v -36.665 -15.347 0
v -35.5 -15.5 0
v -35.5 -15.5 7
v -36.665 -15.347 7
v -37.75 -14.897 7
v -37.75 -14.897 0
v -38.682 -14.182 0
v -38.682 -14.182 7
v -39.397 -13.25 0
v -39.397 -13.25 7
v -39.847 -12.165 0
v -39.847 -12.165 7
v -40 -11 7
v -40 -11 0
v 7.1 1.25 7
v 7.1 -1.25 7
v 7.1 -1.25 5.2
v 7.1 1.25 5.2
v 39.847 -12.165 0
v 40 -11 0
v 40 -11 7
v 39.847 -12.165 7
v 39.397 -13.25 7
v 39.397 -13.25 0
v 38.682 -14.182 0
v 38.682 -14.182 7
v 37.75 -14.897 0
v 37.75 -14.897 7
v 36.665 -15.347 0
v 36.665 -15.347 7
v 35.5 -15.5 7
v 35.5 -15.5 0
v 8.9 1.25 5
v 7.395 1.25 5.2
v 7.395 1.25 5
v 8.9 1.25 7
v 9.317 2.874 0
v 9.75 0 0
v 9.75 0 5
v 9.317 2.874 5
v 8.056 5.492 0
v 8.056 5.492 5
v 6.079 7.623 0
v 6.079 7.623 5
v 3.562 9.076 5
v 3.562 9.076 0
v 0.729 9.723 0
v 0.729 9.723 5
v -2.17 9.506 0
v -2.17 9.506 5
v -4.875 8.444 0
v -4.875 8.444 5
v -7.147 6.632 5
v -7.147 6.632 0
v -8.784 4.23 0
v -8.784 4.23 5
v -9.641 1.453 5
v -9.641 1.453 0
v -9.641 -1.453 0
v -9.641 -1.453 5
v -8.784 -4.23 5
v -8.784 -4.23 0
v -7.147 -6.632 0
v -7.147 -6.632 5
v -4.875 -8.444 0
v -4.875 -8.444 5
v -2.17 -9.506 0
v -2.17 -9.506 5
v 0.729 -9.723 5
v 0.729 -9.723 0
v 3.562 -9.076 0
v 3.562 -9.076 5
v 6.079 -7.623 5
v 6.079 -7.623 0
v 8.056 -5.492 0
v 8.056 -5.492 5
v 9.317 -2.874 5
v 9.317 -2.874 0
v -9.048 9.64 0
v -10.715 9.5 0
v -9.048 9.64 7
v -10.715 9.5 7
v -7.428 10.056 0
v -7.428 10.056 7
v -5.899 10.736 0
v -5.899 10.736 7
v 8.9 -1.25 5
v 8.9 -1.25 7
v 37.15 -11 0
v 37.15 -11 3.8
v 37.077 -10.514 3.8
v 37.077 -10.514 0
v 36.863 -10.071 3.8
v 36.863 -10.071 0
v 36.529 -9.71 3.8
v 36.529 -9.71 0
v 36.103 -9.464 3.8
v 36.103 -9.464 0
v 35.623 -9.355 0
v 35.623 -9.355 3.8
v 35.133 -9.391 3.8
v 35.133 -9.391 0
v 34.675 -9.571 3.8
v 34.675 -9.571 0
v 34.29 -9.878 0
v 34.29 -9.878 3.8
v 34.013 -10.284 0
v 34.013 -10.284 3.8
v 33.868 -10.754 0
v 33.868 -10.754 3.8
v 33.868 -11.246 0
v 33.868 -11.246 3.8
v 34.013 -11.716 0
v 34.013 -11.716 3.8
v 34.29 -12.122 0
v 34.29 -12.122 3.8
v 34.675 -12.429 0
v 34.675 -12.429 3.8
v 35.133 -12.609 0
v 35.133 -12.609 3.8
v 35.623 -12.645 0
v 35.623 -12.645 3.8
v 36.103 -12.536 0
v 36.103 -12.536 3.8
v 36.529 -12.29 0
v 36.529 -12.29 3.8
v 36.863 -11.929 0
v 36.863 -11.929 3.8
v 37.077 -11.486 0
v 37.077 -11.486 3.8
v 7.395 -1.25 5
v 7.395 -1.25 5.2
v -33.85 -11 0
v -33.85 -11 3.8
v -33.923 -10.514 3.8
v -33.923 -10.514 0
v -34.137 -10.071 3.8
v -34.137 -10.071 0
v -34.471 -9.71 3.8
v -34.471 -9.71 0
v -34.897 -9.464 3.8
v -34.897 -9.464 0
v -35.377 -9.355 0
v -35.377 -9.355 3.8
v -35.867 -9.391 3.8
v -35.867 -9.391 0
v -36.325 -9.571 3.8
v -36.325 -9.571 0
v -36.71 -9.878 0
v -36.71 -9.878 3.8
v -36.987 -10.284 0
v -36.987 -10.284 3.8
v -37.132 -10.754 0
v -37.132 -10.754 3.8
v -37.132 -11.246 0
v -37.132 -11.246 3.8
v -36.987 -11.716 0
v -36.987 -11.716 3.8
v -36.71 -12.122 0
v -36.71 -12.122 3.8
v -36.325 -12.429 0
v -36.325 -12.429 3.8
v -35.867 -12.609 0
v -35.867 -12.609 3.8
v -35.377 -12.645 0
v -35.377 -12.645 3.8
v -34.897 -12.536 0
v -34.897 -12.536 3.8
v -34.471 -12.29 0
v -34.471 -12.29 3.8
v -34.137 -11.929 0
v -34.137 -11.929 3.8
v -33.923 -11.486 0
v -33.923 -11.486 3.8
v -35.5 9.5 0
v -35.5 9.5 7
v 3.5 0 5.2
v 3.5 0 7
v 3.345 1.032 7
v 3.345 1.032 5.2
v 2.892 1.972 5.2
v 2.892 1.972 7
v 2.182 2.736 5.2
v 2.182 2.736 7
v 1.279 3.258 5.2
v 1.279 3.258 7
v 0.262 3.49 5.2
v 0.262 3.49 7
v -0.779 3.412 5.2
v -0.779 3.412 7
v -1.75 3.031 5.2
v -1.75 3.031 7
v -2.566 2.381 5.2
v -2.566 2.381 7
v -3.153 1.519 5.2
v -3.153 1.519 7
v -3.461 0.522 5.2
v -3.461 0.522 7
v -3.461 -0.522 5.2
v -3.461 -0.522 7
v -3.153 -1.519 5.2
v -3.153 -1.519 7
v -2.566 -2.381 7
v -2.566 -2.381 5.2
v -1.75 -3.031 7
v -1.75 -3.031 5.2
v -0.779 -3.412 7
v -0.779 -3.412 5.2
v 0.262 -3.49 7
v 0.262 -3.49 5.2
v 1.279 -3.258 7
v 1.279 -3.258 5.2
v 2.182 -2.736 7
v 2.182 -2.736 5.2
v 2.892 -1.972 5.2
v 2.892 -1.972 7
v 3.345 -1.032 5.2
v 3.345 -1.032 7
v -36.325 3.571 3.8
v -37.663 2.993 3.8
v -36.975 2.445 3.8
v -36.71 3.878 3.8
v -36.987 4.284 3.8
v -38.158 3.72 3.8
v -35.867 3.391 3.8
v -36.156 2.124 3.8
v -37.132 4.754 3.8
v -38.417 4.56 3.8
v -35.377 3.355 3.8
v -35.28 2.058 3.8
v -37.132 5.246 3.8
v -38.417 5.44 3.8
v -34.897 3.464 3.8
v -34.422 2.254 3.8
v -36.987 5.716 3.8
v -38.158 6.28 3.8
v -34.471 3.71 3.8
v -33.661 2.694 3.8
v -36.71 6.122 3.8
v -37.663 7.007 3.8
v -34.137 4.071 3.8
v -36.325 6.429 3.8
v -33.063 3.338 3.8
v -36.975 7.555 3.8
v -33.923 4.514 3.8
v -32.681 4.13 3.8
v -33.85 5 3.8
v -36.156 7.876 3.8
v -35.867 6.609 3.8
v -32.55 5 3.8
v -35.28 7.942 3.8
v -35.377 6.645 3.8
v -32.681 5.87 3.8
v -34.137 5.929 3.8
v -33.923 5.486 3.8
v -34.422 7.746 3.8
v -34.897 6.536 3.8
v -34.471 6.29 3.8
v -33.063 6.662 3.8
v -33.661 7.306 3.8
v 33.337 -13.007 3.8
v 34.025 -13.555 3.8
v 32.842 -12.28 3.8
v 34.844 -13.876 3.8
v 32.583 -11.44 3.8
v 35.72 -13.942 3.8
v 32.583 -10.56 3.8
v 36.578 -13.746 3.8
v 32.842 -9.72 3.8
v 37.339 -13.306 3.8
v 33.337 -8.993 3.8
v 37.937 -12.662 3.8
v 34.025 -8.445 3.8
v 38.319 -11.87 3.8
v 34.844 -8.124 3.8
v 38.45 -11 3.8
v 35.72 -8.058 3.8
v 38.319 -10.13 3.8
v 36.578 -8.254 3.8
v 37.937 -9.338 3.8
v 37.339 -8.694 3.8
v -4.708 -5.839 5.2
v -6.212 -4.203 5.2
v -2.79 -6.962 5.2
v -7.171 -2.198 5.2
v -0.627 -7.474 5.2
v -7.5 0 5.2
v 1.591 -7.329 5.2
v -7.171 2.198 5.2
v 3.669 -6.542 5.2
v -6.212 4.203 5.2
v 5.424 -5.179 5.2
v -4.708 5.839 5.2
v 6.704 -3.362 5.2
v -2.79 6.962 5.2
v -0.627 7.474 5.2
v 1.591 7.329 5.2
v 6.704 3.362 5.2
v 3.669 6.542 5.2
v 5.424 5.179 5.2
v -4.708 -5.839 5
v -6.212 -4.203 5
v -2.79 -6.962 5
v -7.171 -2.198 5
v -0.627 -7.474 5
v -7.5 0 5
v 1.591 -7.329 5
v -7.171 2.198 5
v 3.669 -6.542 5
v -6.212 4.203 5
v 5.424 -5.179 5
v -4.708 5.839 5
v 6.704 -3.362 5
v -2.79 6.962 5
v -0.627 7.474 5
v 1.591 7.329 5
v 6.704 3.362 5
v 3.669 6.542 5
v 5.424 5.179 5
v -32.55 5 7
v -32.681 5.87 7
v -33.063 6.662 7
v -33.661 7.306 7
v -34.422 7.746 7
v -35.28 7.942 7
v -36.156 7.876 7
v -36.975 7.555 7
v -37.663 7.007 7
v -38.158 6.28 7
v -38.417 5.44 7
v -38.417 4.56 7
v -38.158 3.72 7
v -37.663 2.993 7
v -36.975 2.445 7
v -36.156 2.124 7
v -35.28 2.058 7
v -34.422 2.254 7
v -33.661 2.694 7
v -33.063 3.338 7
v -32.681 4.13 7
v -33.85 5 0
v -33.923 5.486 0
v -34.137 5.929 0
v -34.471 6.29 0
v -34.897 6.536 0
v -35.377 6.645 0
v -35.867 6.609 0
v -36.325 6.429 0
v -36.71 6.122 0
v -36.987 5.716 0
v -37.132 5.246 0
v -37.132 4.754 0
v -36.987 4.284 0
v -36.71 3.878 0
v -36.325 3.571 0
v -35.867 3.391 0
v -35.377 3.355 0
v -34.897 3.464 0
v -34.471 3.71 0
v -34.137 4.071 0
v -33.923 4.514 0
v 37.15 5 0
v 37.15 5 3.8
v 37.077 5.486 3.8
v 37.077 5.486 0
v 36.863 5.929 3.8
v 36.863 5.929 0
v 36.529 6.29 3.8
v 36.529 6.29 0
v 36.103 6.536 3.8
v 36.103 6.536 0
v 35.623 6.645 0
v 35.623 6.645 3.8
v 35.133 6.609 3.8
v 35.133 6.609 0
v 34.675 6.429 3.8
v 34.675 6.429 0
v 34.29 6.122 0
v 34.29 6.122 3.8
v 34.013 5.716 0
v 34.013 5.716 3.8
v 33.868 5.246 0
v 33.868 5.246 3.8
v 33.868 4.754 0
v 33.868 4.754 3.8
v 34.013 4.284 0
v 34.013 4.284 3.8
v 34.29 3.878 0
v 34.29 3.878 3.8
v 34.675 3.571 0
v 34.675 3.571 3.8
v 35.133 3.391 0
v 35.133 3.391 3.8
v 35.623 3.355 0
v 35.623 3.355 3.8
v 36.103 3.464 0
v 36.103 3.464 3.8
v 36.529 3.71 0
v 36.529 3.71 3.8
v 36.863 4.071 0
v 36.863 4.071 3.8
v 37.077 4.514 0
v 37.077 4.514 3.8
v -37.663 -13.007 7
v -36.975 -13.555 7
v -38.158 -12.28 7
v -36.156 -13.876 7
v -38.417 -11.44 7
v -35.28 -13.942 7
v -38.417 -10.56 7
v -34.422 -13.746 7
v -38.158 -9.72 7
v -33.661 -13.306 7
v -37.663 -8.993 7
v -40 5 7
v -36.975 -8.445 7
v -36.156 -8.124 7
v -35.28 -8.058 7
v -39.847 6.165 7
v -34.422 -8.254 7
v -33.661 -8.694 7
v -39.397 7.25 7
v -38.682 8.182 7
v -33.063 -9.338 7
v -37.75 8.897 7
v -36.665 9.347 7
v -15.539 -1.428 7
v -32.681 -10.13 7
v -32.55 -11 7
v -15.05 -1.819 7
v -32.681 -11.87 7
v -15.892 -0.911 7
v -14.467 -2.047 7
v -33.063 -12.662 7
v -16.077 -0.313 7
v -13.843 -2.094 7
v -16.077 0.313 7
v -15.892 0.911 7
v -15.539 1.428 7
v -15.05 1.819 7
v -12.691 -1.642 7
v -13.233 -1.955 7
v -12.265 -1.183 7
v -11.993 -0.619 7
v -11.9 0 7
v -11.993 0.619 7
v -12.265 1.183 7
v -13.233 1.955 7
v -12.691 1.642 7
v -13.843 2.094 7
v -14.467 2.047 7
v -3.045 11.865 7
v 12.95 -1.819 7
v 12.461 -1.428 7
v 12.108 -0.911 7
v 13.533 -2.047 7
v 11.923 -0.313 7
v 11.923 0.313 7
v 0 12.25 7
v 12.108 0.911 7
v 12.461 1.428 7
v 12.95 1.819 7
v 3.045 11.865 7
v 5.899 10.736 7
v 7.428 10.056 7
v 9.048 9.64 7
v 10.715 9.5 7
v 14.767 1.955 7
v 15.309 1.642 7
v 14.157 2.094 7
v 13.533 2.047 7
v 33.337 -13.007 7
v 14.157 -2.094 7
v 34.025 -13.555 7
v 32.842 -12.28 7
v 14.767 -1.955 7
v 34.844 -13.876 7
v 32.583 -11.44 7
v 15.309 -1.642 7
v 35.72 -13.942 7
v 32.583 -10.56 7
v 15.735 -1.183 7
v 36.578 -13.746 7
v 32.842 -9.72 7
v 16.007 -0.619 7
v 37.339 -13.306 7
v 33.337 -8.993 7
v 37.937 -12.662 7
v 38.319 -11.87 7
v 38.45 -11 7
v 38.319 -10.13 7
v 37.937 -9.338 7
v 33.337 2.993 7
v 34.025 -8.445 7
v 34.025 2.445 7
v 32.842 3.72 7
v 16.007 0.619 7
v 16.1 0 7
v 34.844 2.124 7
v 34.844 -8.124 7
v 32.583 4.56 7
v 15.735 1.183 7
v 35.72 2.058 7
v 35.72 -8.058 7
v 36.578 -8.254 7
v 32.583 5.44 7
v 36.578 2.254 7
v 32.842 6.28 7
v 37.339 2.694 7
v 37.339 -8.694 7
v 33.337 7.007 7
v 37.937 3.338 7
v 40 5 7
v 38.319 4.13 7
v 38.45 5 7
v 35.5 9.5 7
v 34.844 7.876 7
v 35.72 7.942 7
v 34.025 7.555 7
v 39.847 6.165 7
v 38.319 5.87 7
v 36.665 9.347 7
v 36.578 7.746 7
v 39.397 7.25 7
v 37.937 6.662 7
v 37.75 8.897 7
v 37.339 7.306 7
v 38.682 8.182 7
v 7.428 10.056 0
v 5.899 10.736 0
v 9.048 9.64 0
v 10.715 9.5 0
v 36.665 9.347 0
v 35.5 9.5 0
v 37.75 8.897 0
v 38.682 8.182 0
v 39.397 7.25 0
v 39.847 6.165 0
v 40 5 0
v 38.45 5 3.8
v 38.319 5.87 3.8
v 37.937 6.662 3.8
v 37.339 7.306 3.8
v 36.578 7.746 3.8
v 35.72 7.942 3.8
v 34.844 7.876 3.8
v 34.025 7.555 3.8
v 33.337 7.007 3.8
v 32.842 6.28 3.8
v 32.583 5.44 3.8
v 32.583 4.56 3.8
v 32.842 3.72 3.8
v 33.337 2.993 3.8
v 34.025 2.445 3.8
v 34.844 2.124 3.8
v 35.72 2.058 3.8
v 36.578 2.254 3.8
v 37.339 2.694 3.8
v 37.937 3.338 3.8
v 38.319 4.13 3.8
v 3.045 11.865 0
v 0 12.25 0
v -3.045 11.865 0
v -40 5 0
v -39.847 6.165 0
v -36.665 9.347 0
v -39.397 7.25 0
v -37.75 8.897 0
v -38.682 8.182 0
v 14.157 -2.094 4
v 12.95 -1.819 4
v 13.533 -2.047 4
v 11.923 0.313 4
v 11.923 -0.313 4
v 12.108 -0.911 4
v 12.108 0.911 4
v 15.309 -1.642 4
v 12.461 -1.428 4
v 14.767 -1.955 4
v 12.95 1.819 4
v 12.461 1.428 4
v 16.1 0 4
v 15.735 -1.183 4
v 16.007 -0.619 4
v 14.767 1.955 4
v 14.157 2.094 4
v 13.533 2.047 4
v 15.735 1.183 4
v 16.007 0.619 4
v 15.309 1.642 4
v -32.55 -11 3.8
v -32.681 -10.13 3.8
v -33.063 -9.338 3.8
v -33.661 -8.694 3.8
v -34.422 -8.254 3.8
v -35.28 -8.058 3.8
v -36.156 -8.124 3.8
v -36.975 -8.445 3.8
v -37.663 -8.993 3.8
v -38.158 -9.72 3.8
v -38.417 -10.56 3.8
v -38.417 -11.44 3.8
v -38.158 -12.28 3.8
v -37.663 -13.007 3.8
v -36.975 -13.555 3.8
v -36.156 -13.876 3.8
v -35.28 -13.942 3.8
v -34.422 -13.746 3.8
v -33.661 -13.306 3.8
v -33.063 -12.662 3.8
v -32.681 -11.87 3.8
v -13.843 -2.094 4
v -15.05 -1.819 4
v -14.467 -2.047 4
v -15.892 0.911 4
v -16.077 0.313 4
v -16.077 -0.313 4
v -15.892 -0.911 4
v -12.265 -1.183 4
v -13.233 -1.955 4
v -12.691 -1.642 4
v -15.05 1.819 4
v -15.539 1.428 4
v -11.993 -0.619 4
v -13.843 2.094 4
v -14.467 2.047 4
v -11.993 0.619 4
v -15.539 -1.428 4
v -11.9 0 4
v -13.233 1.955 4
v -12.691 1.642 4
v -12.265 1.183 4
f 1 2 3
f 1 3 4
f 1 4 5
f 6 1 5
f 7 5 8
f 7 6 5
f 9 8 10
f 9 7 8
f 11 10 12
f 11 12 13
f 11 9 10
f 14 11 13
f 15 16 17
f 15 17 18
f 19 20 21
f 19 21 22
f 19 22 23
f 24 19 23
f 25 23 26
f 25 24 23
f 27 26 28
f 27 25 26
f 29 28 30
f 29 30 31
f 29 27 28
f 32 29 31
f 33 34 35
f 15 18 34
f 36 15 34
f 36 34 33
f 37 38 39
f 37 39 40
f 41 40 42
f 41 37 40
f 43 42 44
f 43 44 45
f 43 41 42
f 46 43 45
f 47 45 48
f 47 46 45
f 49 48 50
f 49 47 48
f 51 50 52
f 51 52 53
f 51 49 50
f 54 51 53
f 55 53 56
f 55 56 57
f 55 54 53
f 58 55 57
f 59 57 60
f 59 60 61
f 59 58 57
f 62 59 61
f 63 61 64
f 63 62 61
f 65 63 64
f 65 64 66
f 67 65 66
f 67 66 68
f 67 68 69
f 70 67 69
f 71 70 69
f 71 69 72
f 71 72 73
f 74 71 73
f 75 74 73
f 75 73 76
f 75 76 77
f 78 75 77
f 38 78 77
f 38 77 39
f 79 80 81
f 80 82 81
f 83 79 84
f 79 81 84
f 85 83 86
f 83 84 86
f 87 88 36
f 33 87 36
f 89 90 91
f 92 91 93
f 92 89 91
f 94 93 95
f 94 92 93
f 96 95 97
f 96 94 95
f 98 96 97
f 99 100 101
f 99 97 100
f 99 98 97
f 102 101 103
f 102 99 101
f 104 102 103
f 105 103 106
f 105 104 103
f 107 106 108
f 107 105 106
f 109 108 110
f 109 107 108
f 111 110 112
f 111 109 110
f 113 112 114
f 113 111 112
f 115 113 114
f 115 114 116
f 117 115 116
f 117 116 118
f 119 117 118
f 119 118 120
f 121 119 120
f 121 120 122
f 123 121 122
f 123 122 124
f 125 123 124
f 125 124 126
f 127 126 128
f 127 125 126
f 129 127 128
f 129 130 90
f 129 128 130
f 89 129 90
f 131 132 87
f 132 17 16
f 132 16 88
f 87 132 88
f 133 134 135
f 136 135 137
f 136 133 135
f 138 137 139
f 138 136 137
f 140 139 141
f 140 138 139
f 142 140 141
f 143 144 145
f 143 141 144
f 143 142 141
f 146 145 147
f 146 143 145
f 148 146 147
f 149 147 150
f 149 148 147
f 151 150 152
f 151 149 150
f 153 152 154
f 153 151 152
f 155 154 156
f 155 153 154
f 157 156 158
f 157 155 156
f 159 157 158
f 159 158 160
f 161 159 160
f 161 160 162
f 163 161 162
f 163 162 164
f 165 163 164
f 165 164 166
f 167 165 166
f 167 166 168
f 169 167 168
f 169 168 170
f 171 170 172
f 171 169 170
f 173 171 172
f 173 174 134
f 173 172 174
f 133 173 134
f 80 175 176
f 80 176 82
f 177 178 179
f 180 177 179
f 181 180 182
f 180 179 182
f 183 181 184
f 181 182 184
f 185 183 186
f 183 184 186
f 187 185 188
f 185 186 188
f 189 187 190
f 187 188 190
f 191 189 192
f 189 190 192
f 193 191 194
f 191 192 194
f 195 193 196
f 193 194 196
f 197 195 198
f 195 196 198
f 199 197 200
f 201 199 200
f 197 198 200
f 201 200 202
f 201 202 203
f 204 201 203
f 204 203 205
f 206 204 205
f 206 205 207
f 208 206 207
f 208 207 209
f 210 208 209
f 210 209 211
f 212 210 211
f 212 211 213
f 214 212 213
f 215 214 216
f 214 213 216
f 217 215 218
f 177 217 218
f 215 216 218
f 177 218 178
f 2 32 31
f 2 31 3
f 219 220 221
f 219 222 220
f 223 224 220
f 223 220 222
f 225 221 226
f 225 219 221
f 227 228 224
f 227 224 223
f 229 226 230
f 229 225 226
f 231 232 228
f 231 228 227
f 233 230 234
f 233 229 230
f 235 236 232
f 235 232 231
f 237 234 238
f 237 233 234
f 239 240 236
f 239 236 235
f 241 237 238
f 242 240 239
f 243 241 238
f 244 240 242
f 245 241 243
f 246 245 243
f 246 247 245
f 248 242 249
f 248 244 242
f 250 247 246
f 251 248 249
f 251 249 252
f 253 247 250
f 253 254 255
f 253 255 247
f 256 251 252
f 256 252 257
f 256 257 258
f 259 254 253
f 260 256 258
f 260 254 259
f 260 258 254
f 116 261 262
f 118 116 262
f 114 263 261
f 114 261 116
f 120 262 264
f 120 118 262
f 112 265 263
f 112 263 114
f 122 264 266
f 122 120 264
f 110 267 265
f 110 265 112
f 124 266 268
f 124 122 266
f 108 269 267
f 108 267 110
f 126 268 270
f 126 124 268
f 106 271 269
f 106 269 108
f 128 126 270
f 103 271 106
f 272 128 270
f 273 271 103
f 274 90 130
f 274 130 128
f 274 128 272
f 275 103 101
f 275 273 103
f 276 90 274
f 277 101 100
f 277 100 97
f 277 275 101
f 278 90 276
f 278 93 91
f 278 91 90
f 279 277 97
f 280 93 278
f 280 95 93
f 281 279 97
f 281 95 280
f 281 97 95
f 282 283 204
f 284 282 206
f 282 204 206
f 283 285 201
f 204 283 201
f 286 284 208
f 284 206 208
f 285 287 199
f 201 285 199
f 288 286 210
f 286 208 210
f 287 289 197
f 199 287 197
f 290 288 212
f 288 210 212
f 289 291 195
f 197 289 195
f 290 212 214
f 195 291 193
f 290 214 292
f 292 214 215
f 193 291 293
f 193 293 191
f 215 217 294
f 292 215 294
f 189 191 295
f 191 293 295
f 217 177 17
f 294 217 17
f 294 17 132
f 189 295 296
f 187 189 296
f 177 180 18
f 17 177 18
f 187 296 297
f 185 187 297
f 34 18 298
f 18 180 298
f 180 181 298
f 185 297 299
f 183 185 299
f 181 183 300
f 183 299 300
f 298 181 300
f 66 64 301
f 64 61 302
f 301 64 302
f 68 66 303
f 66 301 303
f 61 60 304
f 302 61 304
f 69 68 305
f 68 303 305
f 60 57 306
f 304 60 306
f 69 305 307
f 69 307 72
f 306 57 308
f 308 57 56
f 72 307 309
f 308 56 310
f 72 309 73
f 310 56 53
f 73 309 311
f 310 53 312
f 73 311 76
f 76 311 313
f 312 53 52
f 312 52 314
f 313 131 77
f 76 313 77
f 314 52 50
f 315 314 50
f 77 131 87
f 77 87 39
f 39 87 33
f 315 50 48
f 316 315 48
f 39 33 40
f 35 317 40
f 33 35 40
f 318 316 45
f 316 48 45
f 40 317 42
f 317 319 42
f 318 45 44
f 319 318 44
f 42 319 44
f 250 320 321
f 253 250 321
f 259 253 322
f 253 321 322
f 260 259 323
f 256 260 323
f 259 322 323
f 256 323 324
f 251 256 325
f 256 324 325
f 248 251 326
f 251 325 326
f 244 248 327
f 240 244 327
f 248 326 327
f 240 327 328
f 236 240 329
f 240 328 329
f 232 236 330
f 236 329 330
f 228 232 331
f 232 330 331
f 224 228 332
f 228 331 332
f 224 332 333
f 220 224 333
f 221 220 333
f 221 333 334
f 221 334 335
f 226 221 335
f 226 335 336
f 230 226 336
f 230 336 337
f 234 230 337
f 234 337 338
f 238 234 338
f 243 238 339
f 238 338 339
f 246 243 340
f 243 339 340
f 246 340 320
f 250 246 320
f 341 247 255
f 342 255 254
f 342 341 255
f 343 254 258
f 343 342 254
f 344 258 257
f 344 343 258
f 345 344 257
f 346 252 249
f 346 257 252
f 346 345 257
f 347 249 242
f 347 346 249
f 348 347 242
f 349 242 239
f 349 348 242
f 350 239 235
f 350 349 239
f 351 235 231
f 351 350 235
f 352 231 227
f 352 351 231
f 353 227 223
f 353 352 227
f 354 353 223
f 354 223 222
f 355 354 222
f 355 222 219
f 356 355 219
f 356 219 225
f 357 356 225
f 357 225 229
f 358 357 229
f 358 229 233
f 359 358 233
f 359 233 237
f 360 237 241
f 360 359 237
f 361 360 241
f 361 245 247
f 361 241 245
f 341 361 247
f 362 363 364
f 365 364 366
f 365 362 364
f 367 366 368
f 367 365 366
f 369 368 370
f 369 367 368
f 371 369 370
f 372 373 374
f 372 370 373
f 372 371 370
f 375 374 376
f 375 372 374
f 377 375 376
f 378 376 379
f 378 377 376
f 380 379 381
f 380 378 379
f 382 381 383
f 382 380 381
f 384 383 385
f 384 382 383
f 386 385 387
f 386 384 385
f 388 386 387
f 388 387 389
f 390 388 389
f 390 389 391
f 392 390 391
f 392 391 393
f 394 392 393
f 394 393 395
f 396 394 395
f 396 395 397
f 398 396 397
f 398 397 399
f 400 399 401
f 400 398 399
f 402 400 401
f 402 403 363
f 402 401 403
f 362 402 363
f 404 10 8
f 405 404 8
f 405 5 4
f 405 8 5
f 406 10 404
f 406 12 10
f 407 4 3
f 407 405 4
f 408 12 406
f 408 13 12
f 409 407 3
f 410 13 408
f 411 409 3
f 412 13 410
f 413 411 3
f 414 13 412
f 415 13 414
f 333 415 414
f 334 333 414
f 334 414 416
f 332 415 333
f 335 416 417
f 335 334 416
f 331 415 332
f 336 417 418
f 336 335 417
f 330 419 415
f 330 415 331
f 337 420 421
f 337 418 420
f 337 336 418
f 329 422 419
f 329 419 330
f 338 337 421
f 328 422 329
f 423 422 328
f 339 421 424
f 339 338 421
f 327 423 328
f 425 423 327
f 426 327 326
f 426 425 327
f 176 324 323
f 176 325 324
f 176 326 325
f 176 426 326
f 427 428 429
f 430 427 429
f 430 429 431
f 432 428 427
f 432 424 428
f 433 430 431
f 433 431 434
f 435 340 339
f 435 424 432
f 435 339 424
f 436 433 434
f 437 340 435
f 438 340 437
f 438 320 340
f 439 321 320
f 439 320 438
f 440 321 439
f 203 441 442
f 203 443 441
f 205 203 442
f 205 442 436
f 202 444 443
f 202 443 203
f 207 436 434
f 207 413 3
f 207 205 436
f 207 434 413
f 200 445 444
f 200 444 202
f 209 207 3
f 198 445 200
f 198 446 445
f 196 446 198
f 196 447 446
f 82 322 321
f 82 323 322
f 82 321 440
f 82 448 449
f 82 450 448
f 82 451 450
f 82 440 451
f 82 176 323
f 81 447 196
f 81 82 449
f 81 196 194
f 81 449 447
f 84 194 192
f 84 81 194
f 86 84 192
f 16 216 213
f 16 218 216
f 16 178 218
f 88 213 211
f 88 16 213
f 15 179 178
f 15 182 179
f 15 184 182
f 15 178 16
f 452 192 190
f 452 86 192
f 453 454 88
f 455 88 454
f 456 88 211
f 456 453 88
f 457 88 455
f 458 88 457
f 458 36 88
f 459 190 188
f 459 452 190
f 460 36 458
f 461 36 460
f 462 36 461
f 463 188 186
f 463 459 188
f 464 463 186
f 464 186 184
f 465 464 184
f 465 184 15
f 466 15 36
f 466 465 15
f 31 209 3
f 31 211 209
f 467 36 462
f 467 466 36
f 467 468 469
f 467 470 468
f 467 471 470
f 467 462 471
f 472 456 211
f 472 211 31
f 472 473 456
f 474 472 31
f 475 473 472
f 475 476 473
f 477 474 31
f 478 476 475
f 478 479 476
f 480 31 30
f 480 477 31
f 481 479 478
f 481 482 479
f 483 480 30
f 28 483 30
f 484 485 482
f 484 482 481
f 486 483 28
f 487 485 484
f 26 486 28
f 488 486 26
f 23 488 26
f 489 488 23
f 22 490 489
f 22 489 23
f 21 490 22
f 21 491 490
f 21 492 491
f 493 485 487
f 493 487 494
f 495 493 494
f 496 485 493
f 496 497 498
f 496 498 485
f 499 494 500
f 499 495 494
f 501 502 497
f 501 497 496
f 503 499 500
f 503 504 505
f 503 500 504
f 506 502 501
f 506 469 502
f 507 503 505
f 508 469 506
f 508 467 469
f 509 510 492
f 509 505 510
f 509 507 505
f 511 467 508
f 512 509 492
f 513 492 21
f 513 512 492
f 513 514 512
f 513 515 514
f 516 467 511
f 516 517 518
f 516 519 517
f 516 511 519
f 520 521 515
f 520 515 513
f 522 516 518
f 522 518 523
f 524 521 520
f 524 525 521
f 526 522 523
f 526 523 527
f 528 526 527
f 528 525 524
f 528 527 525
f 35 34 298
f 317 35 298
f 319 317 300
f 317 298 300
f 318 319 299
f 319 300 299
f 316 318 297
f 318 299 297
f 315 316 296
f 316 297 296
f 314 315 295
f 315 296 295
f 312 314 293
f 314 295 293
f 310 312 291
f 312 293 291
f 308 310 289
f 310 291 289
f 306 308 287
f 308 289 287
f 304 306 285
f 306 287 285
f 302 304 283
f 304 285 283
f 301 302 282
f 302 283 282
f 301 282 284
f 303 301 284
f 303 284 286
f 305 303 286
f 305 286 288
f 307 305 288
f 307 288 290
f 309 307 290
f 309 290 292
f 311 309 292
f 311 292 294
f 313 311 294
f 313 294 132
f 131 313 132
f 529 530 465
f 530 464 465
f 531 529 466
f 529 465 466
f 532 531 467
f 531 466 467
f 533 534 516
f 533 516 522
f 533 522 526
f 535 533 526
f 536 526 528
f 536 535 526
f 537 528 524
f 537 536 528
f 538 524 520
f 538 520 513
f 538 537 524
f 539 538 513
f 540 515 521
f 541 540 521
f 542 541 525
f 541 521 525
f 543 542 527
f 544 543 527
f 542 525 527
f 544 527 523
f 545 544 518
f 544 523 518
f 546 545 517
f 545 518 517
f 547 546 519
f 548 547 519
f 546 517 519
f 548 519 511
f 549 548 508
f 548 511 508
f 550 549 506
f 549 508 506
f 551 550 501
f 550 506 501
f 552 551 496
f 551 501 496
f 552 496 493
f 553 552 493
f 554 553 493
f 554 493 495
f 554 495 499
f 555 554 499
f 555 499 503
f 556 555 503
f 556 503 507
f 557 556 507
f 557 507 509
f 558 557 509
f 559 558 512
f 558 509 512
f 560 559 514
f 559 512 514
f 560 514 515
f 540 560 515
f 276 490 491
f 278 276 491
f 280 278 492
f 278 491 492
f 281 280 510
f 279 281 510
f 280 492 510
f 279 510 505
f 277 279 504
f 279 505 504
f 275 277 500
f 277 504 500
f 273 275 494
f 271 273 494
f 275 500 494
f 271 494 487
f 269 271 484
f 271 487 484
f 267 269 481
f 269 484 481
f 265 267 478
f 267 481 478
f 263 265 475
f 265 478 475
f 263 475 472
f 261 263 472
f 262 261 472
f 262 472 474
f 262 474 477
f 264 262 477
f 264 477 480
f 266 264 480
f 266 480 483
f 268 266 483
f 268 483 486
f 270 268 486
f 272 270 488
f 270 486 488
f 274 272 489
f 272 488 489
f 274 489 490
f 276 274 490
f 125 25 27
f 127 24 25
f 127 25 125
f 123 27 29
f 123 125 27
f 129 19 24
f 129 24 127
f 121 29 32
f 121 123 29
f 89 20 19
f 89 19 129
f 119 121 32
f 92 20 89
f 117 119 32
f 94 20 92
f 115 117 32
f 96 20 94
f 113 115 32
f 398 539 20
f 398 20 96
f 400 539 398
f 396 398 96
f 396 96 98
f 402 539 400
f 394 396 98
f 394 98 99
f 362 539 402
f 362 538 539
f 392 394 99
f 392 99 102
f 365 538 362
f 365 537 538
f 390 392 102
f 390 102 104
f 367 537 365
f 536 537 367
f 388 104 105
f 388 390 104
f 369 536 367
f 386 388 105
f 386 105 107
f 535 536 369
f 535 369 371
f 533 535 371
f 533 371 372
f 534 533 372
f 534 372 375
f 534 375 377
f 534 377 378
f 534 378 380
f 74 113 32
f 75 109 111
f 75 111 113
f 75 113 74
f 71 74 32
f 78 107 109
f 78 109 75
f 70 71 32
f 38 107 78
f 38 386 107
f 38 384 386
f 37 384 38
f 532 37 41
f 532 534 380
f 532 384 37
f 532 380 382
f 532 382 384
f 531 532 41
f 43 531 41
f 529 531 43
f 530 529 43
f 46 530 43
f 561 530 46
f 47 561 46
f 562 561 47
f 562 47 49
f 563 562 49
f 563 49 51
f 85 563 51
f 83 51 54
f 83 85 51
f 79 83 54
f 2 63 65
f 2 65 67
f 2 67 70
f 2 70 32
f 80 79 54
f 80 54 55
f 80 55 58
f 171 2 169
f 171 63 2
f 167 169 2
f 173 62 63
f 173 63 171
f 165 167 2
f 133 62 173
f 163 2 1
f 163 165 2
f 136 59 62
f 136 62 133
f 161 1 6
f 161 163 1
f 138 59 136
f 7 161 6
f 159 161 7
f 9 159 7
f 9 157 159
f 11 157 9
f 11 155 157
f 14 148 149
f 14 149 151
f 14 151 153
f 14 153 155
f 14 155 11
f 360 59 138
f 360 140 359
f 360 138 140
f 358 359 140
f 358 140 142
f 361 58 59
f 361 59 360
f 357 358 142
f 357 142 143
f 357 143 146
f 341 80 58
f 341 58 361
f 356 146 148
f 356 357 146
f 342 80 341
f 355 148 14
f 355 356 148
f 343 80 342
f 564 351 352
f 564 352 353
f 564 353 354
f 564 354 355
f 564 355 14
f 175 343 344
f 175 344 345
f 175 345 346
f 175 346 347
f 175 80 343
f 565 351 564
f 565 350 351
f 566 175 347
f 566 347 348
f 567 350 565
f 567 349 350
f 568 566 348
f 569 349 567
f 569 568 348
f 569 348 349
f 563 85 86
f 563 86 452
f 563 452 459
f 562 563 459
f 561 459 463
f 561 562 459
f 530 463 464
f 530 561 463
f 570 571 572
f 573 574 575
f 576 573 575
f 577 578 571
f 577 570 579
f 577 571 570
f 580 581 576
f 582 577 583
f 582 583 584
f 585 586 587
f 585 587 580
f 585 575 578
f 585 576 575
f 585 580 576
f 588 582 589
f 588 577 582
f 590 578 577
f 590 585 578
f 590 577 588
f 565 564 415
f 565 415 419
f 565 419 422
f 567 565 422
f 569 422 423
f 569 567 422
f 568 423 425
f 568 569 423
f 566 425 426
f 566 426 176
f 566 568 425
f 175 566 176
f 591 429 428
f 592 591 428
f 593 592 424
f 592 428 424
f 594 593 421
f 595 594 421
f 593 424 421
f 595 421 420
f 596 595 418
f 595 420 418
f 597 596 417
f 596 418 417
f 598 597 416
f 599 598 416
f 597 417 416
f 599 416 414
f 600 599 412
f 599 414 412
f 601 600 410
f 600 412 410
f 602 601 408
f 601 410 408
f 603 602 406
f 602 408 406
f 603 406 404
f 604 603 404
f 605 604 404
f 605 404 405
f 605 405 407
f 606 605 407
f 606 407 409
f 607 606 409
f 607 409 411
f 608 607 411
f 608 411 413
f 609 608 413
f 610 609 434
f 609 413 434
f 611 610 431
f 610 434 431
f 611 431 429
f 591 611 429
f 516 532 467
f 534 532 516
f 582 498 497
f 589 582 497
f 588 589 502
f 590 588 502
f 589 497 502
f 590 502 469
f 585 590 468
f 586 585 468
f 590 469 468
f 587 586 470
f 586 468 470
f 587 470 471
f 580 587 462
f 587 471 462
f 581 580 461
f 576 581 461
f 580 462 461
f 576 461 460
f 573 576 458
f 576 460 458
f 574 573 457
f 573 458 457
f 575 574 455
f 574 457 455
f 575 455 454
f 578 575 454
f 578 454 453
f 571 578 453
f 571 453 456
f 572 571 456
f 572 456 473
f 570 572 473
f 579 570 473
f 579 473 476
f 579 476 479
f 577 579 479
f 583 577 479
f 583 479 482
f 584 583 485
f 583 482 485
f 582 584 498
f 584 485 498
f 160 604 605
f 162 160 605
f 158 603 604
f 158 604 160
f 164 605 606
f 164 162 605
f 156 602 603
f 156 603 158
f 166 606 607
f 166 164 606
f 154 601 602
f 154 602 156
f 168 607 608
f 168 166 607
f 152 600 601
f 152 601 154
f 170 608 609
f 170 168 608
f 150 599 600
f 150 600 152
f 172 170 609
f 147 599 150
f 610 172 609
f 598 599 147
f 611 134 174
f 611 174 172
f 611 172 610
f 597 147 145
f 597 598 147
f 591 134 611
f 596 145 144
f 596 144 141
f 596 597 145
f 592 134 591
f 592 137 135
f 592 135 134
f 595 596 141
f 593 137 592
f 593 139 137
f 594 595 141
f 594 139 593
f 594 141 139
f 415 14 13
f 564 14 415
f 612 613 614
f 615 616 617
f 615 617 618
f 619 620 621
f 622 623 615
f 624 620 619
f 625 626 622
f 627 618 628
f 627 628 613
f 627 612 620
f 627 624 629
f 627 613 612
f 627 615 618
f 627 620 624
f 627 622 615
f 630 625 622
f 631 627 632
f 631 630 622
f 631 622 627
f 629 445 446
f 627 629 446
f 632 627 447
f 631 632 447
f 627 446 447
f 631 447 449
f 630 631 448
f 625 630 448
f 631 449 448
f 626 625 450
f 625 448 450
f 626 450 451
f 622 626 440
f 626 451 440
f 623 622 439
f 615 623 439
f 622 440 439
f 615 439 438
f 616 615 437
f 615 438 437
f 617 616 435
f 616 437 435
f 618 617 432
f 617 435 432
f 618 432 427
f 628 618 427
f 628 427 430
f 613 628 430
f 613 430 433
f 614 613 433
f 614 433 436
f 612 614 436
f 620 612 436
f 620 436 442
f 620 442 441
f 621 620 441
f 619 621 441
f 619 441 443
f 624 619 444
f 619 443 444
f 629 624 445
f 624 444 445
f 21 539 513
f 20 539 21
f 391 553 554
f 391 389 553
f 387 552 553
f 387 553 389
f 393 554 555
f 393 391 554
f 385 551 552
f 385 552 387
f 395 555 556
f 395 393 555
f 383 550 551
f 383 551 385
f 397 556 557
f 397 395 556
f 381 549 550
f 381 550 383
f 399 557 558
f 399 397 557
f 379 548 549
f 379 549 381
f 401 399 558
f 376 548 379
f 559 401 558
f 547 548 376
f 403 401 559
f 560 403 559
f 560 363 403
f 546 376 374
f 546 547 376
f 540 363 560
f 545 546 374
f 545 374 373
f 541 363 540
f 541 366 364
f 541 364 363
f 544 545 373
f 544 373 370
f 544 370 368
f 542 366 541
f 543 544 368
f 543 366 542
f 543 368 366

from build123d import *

# Parameters (mm, degrees)
SKETCH1_R           = 9.75
SKETCH1_R_2         = 1.65
BOSS_EXTRUDE1_DEPTH = 7
FILLET1_R           = 10
SKETCH2_R           = 9.75
SKETCH2_R_2         = 7.5
BOSS_EXTRUDE2_DEPTH = 2
SKETCH3_R           = 7.5
SKETCH3_R_2         = 3.5
BOSS_EXTRUDE3_DEPTH = 1.8
SKETCH4_W           = 1.8
SKETCH4_H           = 2.5
CUT_EXTRUDE1_DEPTH  = 2.5
SKETCH5_R           = 2.1
CUT_EXTRUDE2_DEPTH  = 3
SKETCH6_R           = 2.95
CUT_EXTRUDE3_DEPTH  = 3.2


with BuildPart() as part:
    # Sketch1 → Boss-Extrude1 (new body)
    with BuildSketch(Plane.XY):
        with BuildLine():
            Line((-35.5, 9.5), (-7.733854149, 9.5))
            ThreePointArc((-7.733854149, 9.5), (0, 12.25), (7.733854149, 9.5))
            Line((7.733854149, 9.5), (35.5, 9.5))
            ThreePointArc((35.5, 9.5), (38.681980515, 8.181980515), (40, 5))
            Line((40, 5), (40, -11))
            ThreePointArc((40, -11), (38.681980515, -14.181980515), (35.5, -15.5))
            Line((35.5, -15.5), (-35.5, -15.5))
            ThreePointArc((-35.5, -15.5), (-38.681980515, -14.181980515), (-40, -11))
            Line((-40, -11), (-40, 5))
            ThreePointArc((-40, 5), (-38.681980515, 8.181980515), (-35.5, 9.5))
        make_face()
        Circle(SKETCH1_R, mode=Mode.SUBTRACT)
        with Locations((-35.5, 5)):
            Circle(SKETCH1_R_2, mode=Mode.SUBTRACT)
        with Locations((35.5, 5)):
            Circle(SKETCH1_R_2, mode=Mode.SUBTRACT)
        with Locations((-35.5, -11)):
            Circle(SKETCH1_R_2, mode=Mode.SUBTRACT)
        with Locations((35.5, -11)):
            Circle(SKETCH1_R_2, mode=Mode.SUBTRACT)
    extrude(amount=BOSS_EXTRUDE1_DEPTH)

    # Fillet1
    fillet1_edges = [part.edges().sort_by_distance(p)[0] for p in [
        (7.733854149, 9.5, 3.5),
        (-7.733854149, 9.5, 3.5),
    ]]
    fillet(fillet1_edges, radius=FILLET1_R)

    # Sketch2 → Boss-Extrude2 (add)
    with BuildSketch(Plane.XY.offset(7)):
        Circle(SKETCH2_R)
        Circle(SKETCH2_R_2, mode=Mode.SUBTRACT)
    extrude(amount=-BOSS_EXTRUDE2_DEPTH)

    # Sketch3 → Boss-Extrude3 (add)
    with BuildSketch(Plane.XY.offset(7)):
        Circle(SKETCH3_R)
        Circle(SKETCH3_R_2, mode=Mode.SUBTRACT)
    extrude(amount=-BOSS_EXTRUDE3_DEPTH)

    # Sketch4 → Cut-Extrude1 (cut)
    with BuildSketch(Plane.XY.offset(7)):
        with Locations((8, 0)):
            Rectangle(SKETCH4_W, SKETCH4_H)
    extrude(amount=-CUT_EXTRUDE1_DEPTH, mode=Mode.SUBTRACT)

    # Sketch5 → Cut-Extrude2 (cut)
    with BuildSketch(Plane.XY.offset(7)):
        with Locations((-14, 0)):
            Circle(SKETCH5_R)
        with Locations((14, 0)):
            Circle(SKETCH5_R)
    extrude(amount=-CUT_EXTRUDE2_DEPTH, mode=Mode.SUBTRACT)

    # Sketch6 → Cut-Extrude3 (cut)
    with BuildSketch(Plane.XY.offset(7)):
        with Locations((-35.5, 5)):
            Circle(SKETCH6_R)
        with Locations((-35.5, -11)):
            Circle(SKETCH6_R)
        with Locations((35.5, -11)):
            Circle(SKETCH6_R)
        with Locations((35.5, 5)):
            Circle(SKETCH6_R)
    extrude(amount=-CUT_EXTRUDE3_DEPTH, mode=Mode.SUBTRACT)


solid = part.part
